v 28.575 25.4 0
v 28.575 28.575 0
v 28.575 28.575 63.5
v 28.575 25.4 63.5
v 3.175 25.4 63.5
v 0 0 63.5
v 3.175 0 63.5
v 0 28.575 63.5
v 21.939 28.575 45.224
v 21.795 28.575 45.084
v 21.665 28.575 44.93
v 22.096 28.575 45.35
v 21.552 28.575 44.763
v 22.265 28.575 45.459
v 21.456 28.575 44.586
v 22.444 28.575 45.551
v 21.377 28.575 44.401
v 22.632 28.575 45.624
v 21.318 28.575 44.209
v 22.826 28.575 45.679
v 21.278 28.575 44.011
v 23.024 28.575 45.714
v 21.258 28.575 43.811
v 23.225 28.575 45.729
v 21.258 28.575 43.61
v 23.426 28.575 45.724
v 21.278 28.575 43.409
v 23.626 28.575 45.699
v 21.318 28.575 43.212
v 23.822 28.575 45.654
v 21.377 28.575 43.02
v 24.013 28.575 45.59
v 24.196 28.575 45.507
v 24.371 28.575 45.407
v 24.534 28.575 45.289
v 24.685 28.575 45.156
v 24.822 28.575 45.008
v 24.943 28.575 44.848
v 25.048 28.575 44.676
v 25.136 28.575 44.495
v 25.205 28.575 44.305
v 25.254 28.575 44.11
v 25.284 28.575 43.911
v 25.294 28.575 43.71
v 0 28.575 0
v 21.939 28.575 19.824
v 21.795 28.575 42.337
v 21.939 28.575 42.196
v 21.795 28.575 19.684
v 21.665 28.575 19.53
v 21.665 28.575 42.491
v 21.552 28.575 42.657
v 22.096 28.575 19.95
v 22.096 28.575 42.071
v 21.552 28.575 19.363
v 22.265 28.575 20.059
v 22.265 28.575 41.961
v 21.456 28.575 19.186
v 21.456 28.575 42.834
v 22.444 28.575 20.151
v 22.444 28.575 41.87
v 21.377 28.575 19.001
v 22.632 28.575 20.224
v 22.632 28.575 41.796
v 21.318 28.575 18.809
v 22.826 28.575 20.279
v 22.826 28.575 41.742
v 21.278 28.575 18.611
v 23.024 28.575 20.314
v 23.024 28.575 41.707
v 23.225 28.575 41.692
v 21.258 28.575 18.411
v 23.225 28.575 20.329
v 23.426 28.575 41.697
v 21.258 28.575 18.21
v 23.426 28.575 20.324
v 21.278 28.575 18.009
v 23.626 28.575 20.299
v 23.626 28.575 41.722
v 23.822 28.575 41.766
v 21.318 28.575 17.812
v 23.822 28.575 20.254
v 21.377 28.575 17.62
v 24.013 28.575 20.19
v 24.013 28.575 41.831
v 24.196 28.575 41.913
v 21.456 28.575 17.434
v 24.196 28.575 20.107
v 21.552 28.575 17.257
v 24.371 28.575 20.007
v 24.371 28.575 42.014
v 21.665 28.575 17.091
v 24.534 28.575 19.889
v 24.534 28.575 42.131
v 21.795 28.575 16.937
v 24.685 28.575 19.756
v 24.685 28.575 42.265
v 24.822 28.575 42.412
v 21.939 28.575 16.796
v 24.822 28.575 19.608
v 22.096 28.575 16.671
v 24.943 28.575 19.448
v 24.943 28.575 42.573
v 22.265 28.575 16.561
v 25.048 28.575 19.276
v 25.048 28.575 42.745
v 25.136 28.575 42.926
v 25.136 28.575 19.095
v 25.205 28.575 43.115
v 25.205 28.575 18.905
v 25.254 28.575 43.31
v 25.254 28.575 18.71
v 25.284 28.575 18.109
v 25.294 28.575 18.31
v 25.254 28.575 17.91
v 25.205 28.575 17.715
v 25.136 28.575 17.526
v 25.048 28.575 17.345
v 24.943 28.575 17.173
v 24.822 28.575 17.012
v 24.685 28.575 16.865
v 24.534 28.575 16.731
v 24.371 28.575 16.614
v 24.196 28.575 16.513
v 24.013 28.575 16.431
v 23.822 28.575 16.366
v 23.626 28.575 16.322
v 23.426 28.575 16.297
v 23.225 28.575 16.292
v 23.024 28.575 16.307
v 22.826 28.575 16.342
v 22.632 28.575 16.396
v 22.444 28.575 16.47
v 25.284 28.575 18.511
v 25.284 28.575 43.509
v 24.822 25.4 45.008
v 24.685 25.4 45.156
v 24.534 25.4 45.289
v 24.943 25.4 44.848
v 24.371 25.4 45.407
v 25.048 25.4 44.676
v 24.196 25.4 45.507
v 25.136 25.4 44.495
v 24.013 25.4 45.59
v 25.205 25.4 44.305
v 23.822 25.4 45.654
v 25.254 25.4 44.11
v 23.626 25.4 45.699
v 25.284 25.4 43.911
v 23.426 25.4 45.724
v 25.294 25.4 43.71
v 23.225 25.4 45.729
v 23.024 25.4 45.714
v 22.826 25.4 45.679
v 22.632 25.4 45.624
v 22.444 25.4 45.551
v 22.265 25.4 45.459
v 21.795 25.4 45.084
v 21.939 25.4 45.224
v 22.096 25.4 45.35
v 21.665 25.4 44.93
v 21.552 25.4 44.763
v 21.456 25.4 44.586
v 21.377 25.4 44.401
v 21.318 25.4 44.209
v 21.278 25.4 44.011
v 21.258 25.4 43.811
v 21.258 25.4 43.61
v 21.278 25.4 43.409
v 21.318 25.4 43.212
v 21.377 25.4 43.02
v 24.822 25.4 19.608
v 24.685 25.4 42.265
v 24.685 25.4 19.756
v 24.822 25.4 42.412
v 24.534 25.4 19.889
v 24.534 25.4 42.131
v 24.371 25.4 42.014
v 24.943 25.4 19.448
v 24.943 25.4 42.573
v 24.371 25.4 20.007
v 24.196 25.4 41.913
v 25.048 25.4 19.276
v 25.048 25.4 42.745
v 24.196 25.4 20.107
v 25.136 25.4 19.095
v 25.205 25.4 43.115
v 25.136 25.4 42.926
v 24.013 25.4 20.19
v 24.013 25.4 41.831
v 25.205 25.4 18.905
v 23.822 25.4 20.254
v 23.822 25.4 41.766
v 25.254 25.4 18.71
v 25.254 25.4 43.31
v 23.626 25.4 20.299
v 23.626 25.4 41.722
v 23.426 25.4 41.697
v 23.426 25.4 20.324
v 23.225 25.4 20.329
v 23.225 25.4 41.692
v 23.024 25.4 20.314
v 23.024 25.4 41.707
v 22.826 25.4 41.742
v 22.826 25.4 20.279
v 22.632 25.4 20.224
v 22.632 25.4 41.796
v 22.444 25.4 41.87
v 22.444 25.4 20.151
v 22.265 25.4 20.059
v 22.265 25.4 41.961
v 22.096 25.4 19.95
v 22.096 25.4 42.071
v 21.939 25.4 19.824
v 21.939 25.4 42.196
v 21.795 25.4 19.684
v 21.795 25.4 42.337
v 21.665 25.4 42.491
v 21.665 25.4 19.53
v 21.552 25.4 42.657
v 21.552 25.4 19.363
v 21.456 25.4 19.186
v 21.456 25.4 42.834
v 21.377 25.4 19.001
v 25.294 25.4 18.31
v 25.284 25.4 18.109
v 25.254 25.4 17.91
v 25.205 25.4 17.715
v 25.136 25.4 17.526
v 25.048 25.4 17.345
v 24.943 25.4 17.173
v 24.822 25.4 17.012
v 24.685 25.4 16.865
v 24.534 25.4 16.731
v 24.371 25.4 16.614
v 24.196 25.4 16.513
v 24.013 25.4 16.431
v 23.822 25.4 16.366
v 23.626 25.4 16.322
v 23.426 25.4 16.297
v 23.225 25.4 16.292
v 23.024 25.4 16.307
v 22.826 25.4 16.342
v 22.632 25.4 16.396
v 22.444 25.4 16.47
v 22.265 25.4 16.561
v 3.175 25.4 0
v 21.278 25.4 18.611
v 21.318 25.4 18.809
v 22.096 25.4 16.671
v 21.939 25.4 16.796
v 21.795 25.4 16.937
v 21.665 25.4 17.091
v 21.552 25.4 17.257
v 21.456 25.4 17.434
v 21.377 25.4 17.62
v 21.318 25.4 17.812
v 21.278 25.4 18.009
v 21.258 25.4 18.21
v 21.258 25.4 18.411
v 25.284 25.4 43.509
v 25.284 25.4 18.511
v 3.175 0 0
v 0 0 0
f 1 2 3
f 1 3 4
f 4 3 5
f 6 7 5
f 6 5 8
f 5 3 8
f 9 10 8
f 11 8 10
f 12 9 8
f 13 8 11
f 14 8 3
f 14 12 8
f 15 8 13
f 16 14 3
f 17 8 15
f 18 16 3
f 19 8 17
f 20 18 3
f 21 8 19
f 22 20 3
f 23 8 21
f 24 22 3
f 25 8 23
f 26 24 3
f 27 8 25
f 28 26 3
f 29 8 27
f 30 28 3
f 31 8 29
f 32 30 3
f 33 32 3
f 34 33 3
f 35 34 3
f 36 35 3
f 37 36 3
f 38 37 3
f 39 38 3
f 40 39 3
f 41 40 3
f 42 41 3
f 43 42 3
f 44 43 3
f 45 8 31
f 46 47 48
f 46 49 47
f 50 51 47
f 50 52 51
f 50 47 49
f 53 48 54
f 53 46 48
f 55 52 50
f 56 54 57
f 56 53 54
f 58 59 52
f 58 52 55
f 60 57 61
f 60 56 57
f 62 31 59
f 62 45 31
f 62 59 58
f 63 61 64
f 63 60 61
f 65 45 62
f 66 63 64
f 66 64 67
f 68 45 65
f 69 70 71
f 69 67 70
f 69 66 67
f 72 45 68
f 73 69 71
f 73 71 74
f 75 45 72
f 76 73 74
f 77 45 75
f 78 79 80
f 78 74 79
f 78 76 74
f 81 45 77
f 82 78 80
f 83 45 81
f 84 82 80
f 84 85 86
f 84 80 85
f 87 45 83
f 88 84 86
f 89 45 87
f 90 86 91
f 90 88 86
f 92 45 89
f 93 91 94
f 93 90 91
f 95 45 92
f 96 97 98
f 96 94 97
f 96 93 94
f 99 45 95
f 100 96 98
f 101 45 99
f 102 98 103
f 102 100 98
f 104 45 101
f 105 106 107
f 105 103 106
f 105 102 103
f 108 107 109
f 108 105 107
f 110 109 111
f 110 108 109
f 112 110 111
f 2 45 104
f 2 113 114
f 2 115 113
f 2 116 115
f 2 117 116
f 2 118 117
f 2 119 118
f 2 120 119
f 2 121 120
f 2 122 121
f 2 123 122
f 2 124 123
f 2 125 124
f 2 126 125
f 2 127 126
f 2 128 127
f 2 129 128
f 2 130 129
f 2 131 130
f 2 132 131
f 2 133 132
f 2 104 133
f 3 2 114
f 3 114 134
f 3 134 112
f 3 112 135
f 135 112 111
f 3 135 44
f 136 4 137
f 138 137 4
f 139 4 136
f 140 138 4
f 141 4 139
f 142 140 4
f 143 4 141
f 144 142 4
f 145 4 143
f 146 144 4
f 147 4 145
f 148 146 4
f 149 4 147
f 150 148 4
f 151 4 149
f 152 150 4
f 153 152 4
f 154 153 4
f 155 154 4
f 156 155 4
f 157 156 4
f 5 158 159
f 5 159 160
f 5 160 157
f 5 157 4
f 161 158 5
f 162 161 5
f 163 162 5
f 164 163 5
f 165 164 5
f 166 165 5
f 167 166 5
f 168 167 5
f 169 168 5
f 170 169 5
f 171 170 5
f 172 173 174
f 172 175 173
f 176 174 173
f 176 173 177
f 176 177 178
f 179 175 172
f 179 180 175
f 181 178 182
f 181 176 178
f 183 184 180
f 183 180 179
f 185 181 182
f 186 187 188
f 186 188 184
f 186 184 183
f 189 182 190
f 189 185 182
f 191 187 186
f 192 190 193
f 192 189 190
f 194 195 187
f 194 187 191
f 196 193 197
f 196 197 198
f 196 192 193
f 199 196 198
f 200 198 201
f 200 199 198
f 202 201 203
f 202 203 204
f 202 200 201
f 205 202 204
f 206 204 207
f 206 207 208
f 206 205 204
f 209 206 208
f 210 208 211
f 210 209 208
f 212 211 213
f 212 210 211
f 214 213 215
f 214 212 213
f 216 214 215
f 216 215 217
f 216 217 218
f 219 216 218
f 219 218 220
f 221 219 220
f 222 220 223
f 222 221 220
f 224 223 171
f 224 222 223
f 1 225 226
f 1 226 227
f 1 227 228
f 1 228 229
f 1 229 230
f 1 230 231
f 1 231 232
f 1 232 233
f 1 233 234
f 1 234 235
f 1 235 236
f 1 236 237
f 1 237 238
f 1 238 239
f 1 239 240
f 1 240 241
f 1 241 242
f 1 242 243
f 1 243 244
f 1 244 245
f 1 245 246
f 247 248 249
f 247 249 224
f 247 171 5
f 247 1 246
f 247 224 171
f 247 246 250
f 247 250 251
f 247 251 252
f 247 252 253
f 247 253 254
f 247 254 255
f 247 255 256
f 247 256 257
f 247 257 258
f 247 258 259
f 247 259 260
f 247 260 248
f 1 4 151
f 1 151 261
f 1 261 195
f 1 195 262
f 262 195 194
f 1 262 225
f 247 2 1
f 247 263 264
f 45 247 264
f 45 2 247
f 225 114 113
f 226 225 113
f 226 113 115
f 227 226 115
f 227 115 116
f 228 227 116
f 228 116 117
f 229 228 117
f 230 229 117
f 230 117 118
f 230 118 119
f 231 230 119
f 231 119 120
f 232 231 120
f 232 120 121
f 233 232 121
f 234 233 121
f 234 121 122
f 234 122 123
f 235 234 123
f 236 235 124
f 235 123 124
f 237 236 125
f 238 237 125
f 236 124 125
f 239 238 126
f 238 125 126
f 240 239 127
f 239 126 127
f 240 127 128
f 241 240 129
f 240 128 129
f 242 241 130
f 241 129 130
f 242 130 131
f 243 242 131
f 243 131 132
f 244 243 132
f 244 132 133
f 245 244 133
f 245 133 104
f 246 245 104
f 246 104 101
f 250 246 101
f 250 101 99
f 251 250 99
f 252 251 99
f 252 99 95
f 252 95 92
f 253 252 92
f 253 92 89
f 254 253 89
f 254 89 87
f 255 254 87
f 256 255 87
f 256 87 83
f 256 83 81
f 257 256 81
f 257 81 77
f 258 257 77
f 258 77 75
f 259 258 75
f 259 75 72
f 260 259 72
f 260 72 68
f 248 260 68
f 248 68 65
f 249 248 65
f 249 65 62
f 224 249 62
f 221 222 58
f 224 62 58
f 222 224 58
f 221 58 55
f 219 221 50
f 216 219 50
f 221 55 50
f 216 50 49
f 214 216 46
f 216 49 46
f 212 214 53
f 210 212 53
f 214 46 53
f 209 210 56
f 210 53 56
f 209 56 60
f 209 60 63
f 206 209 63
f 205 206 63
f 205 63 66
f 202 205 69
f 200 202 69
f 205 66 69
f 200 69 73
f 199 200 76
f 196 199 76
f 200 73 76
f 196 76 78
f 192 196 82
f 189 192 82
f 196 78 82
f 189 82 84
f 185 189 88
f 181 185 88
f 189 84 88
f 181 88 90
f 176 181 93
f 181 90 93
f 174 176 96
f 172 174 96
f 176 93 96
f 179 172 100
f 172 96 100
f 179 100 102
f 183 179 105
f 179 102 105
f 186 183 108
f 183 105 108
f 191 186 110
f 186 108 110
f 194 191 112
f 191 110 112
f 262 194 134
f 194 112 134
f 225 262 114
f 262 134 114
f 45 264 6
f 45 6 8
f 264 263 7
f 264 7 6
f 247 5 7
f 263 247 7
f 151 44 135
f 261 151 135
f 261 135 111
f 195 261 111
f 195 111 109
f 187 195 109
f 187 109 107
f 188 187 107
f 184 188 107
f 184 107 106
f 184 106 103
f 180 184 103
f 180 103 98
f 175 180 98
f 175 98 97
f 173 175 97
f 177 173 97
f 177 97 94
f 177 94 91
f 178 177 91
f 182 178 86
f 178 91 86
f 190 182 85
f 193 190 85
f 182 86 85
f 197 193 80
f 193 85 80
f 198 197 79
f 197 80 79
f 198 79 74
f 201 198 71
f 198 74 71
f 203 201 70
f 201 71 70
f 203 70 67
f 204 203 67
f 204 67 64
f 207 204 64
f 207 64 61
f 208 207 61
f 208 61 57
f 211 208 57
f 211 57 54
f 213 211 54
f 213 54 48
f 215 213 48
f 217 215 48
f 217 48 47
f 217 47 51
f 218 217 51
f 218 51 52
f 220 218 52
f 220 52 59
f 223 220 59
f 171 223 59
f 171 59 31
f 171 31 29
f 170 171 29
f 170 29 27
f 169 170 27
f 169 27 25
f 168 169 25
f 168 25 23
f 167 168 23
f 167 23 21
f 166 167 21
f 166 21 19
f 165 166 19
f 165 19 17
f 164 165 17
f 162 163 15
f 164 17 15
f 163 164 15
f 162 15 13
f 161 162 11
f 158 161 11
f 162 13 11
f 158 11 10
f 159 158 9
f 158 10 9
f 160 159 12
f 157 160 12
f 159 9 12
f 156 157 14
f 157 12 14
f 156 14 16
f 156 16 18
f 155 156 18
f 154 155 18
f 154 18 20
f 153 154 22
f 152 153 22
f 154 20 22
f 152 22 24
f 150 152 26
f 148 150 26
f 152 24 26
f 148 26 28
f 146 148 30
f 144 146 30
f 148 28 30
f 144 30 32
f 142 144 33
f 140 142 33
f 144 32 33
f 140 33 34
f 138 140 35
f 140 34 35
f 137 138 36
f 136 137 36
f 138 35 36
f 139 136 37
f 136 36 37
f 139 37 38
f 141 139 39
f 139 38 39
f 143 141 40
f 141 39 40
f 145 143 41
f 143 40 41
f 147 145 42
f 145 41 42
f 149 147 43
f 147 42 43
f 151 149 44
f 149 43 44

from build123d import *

# Parameters (mm, degrees)
BOSS_EXTRUDE1_DEPTH = 63.5
CUT_EXTRUDE1_REACH  = 30.575
SKETCH2_R           = 2.0193


with BuildPart() as part:
    # Sketch1 → Boss-Extrude1 (new body)
    with BuildSketch(Plane.XY):
        Polygon((0, 0), (0, 28.575), (28.575, 28.575), (28.575, 25.4), (3.175, 25.4), (3.175, 0), align=None)
    extrude(amount=BOSS_EXTRUDE1_DEPTH)

    # Sketch2 → Cut-Extrude1 (cut, up to next)
    with BuildSketch(Plane(origin=(0, 28.575, 0), x_dir=(1, 0, 0), z_dir=(0, 1, 0)), mode=Mode.PRIVATE) as cut_extrude1_sk1:
        with Locations((23.275, -43.710246093)):
            Circle(SKETCH2_R)
    cut_extrude1_tool1 = extrude(cut_extrude1_sk1.sketch, amount=-CUT_EXTRUDE1_REACH, mode=Mode.PRIVATE) & part.part
    add(cut_extrude1_tool1.solids().sort_by_distance((23.275, 28.575, 43.710246))[0], mode=Mode.SUBTRACT)
    # Sketch2 → Cut-Extrude1 (cut, up to next)
    with BuildSketch(Plane(origin=(0, 28.575, 0), x_dir=(1, 0, 0), z_dir=(0, 1, 0)), mode=Mode.PRIVATE) as cut_extrude1_sk2:
        with Locations((23.275, -18.310246093)):
            Circle(SKETCH2_R)
    cut_extrude1_tool2 = extrude(cut_extrude1_sk2.sketch, amount=-CUT_EXTRUDE1_REACH, mode=Mode.PRIVATE) & part.part
    add(cut_extrude1_tool2.solids().sort_by_distance((23.275, 28.575, 18.310246))[0], mode=Mode.SUBTRACT)


solid = part.part
